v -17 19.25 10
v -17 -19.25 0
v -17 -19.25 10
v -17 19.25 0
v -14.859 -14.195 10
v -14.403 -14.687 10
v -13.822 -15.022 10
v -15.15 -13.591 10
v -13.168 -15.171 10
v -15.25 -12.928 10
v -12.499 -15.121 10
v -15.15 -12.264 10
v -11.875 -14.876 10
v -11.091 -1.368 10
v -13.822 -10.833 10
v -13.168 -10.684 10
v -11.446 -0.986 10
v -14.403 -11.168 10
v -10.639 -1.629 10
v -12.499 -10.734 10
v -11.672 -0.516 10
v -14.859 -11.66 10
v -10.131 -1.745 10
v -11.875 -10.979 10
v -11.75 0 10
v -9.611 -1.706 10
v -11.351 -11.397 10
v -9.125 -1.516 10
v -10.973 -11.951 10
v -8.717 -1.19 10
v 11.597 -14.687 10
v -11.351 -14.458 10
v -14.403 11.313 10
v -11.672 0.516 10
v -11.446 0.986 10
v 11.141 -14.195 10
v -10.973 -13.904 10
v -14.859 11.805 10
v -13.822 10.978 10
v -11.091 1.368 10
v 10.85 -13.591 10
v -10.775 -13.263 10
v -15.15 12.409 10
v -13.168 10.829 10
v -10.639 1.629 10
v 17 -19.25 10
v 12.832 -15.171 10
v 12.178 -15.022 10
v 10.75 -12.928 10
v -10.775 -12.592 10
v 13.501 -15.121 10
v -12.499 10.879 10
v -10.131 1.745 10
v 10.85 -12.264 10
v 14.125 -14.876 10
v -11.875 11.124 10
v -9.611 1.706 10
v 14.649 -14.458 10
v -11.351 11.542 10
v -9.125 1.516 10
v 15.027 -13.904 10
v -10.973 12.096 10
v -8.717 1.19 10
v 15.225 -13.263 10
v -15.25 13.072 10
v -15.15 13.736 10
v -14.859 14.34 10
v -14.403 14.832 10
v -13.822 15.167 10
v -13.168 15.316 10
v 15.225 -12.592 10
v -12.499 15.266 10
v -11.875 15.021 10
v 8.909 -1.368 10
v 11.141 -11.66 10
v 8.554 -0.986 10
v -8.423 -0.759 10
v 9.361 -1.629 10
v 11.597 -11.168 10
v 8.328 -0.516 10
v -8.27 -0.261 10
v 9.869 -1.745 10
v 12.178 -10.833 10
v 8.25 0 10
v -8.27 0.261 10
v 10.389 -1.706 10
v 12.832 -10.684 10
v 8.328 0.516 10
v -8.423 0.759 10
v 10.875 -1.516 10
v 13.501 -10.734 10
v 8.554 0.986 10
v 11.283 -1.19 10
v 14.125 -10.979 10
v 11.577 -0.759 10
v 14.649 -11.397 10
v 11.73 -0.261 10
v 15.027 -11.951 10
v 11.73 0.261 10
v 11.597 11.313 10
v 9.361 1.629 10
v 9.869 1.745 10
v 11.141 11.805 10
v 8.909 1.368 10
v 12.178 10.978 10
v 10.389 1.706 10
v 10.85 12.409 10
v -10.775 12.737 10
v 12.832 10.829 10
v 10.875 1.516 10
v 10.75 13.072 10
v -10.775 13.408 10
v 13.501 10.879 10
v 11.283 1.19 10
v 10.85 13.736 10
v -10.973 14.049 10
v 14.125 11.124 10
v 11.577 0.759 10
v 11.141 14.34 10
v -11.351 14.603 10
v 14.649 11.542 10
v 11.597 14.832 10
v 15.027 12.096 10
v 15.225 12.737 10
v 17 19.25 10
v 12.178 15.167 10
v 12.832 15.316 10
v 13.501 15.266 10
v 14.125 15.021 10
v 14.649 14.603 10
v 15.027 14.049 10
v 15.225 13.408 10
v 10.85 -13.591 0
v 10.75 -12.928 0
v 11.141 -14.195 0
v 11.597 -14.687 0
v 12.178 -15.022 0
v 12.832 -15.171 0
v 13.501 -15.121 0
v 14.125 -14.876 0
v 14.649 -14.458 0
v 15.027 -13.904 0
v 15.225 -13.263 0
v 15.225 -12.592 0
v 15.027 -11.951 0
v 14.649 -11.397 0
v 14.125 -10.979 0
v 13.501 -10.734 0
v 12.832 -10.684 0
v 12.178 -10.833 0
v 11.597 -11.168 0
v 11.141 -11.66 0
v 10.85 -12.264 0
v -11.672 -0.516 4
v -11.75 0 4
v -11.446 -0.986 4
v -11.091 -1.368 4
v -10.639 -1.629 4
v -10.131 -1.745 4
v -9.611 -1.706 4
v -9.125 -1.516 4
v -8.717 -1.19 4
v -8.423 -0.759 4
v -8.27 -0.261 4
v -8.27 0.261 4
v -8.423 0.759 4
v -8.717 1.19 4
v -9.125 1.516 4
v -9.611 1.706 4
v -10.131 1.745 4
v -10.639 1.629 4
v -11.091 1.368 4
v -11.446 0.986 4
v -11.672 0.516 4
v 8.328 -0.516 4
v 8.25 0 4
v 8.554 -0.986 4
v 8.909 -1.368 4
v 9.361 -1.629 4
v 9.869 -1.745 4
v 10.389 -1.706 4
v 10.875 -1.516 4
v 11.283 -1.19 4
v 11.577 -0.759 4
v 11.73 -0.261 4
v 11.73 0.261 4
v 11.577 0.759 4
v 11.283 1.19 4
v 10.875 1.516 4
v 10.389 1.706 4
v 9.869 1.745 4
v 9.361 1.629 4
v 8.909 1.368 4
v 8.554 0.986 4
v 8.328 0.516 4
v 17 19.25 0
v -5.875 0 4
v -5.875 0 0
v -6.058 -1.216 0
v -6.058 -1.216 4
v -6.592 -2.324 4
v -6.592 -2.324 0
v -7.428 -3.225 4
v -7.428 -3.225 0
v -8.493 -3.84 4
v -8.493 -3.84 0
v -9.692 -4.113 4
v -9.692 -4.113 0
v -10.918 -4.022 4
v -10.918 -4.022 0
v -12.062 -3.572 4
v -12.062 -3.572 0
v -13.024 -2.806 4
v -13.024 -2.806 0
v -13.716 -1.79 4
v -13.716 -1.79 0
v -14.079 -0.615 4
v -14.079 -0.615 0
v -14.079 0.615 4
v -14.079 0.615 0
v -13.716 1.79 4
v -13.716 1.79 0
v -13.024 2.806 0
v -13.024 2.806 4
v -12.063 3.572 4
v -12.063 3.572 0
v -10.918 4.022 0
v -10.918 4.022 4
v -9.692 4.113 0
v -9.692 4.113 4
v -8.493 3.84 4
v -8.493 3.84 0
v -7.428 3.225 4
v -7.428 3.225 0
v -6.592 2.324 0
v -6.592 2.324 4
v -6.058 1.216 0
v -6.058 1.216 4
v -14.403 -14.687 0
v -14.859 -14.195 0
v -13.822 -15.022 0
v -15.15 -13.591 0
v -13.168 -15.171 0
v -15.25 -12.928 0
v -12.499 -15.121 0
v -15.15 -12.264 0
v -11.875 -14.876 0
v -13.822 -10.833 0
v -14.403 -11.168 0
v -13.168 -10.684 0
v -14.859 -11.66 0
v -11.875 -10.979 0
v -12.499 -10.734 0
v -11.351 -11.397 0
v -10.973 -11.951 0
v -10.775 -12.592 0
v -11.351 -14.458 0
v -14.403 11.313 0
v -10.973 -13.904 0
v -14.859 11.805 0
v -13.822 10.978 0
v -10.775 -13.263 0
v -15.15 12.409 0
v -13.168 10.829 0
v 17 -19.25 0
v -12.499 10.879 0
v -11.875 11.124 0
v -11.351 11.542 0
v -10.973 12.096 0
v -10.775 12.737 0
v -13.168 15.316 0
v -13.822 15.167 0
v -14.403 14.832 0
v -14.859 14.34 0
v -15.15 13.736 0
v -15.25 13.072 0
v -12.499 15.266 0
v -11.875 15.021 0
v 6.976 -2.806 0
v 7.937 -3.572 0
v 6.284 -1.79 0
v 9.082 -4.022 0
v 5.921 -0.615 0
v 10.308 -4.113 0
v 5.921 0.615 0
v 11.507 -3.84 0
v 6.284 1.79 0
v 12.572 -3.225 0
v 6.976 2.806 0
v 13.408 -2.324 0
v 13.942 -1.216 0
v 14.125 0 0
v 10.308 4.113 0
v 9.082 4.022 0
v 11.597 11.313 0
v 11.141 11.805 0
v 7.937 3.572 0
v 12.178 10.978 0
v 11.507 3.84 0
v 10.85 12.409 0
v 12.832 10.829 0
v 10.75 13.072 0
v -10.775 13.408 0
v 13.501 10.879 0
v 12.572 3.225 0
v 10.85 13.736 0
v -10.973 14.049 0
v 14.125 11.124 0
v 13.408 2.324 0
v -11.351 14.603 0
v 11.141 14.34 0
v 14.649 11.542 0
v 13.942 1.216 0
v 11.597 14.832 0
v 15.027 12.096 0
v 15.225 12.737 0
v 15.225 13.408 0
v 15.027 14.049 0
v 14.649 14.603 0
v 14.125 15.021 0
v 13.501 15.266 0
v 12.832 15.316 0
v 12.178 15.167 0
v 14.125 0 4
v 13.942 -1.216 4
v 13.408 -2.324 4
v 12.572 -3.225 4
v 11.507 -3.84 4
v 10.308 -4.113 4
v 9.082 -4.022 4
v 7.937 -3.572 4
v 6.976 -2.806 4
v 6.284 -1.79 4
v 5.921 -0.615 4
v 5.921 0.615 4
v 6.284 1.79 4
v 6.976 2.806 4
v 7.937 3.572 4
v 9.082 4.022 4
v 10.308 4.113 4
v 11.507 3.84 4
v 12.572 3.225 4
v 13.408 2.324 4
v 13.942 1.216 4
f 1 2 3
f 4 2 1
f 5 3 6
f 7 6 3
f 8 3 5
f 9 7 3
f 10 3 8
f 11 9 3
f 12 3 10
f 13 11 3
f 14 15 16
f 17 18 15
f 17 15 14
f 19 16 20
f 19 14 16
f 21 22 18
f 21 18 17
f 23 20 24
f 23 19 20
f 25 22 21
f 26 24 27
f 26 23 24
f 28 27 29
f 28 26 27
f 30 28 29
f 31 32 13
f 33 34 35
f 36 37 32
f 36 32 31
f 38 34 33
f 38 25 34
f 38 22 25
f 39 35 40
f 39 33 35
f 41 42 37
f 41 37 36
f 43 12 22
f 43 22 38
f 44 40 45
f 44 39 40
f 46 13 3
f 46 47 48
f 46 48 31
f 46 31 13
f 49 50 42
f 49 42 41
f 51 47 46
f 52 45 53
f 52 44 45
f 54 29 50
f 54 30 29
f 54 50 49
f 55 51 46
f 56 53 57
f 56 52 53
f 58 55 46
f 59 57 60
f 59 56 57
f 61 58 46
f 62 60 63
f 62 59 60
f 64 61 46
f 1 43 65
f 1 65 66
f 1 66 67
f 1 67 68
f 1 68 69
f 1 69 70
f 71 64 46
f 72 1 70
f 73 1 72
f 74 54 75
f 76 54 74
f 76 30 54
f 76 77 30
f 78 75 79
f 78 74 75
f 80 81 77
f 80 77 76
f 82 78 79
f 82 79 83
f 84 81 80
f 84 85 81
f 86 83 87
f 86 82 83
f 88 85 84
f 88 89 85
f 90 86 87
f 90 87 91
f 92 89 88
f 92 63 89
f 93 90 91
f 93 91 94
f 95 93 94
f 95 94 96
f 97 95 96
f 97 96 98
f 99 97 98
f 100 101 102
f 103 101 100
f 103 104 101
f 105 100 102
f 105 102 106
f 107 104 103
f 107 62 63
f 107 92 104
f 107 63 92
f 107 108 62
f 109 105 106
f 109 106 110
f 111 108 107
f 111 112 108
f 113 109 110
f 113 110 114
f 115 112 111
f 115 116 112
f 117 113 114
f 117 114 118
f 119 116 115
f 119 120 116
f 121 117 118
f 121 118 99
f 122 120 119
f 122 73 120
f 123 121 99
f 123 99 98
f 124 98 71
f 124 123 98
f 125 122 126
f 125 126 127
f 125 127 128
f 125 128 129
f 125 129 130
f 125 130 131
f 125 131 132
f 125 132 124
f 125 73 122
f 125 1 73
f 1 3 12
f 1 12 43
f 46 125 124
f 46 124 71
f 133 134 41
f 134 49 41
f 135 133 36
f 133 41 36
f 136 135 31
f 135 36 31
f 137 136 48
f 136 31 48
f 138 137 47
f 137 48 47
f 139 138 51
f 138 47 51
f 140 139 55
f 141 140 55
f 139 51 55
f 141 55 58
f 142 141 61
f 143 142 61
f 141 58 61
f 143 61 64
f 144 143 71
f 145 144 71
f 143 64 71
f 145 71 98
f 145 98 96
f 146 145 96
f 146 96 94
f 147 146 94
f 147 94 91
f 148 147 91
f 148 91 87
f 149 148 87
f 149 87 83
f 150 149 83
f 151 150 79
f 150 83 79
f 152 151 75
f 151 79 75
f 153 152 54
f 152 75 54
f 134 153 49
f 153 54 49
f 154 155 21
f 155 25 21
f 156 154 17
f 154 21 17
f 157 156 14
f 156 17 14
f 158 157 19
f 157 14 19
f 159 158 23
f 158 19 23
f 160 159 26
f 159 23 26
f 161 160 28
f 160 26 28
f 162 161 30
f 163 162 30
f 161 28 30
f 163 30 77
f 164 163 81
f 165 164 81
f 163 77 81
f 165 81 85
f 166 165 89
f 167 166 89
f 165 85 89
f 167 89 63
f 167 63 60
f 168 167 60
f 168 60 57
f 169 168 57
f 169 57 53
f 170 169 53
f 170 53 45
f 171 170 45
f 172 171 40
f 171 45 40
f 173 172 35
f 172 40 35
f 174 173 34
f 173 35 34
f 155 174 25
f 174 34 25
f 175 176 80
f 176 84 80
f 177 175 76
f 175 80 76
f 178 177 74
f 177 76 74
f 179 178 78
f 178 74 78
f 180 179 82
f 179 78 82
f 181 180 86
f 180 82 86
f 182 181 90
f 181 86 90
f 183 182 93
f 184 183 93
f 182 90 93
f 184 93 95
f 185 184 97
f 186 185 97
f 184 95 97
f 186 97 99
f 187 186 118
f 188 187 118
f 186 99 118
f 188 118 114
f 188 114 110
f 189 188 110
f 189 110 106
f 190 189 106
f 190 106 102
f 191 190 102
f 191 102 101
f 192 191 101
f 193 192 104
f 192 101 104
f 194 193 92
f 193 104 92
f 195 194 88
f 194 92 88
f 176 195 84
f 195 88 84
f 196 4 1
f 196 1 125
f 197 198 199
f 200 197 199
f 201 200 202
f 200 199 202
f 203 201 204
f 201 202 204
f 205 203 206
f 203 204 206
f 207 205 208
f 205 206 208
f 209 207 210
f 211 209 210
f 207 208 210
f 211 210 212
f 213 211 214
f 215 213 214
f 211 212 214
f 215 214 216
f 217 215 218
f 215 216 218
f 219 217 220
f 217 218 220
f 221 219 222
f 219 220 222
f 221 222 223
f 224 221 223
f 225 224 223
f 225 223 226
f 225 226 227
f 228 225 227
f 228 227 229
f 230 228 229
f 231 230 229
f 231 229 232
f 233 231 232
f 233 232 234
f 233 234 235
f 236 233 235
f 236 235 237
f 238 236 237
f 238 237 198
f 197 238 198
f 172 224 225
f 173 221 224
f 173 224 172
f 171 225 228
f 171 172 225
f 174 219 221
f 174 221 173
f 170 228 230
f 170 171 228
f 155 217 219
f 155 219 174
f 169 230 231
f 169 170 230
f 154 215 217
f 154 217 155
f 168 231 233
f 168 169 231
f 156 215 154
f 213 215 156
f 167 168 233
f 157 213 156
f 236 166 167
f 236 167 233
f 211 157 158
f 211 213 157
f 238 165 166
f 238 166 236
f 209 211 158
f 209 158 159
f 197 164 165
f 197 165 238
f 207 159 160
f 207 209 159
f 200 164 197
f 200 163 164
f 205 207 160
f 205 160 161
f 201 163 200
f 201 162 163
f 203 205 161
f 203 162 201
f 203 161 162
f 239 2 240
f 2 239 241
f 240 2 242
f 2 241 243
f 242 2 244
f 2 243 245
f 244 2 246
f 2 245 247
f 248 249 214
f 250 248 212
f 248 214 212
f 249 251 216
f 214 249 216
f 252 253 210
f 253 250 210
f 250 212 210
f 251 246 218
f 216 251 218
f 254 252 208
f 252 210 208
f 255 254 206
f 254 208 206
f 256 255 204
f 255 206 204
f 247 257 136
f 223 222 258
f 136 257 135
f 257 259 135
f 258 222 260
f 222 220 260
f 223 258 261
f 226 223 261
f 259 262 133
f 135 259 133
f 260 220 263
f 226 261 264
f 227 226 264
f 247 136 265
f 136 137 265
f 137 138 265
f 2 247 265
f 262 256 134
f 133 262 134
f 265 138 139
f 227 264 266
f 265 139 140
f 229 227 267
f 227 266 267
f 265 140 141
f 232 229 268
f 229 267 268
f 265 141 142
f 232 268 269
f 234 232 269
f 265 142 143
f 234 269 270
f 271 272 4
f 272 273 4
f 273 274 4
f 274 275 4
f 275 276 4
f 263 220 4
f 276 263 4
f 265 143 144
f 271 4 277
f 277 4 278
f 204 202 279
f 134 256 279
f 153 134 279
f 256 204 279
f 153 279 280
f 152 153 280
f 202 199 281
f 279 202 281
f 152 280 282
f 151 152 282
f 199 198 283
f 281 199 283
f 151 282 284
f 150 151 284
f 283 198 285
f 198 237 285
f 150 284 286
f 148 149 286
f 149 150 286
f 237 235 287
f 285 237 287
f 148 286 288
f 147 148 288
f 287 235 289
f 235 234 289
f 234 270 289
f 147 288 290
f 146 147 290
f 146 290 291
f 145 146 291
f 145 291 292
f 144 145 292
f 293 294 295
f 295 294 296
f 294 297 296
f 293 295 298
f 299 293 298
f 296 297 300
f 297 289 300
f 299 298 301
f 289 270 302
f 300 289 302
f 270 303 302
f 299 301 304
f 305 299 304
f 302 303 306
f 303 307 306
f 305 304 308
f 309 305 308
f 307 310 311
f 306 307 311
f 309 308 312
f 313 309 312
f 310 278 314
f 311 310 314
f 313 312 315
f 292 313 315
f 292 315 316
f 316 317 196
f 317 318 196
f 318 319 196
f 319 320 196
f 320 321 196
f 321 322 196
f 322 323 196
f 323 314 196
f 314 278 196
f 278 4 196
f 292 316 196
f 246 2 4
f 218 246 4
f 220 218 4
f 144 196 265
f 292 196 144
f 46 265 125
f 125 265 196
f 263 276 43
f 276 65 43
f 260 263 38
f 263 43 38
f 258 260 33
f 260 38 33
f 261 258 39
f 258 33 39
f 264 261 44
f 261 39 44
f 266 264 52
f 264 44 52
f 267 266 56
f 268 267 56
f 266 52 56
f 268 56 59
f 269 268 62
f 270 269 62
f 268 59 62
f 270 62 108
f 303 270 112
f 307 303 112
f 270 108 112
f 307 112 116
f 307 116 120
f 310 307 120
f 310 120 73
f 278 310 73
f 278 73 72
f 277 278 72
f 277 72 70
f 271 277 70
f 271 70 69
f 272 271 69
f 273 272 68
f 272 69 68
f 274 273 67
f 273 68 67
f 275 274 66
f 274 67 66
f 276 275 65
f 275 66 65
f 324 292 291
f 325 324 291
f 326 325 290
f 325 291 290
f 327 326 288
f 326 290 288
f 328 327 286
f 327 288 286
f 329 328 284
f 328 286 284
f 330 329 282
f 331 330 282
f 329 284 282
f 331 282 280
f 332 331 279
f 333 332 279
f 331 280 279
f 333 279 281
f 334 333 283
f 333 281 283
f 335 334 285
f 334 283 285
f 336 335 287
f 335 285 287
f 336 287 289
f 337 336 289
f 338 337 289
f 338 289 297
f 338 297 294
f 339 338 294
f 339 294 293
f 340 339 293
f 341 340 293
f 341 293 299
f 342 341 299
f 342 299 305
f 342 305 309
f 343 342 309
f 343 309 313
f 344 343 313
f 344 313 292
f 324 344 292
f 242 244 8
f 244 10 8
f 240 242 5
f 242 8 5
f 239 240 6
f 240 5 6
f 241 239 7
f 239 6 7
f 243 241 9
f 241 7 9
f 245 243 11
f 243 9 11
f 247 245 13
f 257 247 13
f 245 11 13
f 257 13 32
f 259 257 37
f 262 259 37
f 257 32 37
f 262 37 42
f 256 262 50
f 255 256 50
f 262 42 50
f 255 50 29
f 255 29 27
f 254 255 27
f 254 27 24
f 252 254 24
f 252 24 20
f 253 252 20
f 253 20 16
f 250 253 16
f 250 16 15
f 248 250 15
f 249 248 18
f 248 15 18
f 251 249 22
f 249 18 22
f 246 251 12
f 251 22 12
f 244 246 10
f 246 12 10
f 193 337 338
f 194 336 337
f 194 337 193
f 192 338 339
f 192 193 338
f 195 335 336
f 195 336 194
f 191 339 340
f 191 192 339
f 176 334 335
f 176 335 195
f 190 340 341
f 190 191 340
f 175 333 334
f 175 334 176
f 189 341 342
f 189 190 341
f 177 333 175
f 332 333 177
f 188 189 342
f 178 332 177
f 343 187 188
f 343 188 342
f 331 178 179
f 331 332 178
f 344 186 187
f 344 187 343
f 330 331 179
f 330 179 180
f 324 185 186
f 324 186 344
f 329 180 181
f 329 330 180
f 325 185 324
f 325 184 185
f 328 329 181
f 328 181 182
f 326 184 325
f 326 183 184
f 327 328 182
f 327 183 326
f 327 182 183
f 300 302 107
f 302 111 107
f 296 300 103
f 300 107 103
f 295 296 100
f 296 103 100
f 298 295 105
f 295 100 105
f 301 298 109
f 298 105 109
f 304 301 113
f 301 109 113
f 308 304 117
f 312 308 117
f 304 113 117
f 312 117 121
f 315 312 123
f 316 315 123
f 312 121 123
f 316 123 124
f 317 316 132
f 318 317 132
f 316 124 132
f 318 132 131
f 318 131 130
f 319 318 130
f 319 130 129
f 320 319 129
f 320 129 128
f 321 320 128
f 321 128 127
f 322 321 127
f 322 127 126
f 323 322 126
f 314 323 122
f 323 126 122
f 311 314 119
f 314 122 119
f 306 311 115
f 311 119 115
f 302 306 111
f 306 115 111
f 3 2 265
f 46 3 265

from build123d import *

# Parameters (mm, degrees)
F0_W           = 34
F0_H           = 38.5
F1_DEPTH       = 10
F3_D           = 4.5
F3_DEPTH       = 10
F3_TIP         = 1.3519363928
F5_D           = 3.5
F5_DEPTH       = 10
F5_CBORE_D     = 8.25
F5_CBORE_DEPTH = 4
F5_TIP         = 1.0515060833


with BuildPart() as f1:
    # F0 (on Top) → F1 (new body)
    with BuildSketch(Plane.XY):
        Rectangle(F0_W, F0_H)
    extrude(amount=F1_DEPTH)

    # F3
    with Locations(Plane(origin=(0, 0, 0), x_dir=(1, 0, 0), z_dir=(0, 0, -1))):
        with Locations((-13, 12.9276185408), (13, 12.9276185408), (-13, -13.0723814592), (13, -13.0723814592)):
            Hole(F3_D / 2, depth=F3_DEPTH)
            with Locations((0, 0, -(F3_DEPTH + F3_TIP / 2))):  # 118° drill point
                Cone(0, F3_D / 2, F3_TIP, mode=Mode.SUBTRACT)

    # F5
    with Locations(Plane(origin=(0, 0, 0), x_dir=(1, 0, 0), z_dir=(0, 0, -1))):
        with Locations((10, 0), (-10, 0)):
            CounterBoreHole(F5_D / 2, F5_CBORE_D / 2, F5_CBORE_DEPTH, depth=F5_DEPTH)
            with Locations((0, 0, -(F5_DEPTH + F5_TIP / 2))):  # 118° drill point
                Cone(0, F5_D / 2, F5_TIP, mode=Mode.SUBTRACT)


solid = f1.part
